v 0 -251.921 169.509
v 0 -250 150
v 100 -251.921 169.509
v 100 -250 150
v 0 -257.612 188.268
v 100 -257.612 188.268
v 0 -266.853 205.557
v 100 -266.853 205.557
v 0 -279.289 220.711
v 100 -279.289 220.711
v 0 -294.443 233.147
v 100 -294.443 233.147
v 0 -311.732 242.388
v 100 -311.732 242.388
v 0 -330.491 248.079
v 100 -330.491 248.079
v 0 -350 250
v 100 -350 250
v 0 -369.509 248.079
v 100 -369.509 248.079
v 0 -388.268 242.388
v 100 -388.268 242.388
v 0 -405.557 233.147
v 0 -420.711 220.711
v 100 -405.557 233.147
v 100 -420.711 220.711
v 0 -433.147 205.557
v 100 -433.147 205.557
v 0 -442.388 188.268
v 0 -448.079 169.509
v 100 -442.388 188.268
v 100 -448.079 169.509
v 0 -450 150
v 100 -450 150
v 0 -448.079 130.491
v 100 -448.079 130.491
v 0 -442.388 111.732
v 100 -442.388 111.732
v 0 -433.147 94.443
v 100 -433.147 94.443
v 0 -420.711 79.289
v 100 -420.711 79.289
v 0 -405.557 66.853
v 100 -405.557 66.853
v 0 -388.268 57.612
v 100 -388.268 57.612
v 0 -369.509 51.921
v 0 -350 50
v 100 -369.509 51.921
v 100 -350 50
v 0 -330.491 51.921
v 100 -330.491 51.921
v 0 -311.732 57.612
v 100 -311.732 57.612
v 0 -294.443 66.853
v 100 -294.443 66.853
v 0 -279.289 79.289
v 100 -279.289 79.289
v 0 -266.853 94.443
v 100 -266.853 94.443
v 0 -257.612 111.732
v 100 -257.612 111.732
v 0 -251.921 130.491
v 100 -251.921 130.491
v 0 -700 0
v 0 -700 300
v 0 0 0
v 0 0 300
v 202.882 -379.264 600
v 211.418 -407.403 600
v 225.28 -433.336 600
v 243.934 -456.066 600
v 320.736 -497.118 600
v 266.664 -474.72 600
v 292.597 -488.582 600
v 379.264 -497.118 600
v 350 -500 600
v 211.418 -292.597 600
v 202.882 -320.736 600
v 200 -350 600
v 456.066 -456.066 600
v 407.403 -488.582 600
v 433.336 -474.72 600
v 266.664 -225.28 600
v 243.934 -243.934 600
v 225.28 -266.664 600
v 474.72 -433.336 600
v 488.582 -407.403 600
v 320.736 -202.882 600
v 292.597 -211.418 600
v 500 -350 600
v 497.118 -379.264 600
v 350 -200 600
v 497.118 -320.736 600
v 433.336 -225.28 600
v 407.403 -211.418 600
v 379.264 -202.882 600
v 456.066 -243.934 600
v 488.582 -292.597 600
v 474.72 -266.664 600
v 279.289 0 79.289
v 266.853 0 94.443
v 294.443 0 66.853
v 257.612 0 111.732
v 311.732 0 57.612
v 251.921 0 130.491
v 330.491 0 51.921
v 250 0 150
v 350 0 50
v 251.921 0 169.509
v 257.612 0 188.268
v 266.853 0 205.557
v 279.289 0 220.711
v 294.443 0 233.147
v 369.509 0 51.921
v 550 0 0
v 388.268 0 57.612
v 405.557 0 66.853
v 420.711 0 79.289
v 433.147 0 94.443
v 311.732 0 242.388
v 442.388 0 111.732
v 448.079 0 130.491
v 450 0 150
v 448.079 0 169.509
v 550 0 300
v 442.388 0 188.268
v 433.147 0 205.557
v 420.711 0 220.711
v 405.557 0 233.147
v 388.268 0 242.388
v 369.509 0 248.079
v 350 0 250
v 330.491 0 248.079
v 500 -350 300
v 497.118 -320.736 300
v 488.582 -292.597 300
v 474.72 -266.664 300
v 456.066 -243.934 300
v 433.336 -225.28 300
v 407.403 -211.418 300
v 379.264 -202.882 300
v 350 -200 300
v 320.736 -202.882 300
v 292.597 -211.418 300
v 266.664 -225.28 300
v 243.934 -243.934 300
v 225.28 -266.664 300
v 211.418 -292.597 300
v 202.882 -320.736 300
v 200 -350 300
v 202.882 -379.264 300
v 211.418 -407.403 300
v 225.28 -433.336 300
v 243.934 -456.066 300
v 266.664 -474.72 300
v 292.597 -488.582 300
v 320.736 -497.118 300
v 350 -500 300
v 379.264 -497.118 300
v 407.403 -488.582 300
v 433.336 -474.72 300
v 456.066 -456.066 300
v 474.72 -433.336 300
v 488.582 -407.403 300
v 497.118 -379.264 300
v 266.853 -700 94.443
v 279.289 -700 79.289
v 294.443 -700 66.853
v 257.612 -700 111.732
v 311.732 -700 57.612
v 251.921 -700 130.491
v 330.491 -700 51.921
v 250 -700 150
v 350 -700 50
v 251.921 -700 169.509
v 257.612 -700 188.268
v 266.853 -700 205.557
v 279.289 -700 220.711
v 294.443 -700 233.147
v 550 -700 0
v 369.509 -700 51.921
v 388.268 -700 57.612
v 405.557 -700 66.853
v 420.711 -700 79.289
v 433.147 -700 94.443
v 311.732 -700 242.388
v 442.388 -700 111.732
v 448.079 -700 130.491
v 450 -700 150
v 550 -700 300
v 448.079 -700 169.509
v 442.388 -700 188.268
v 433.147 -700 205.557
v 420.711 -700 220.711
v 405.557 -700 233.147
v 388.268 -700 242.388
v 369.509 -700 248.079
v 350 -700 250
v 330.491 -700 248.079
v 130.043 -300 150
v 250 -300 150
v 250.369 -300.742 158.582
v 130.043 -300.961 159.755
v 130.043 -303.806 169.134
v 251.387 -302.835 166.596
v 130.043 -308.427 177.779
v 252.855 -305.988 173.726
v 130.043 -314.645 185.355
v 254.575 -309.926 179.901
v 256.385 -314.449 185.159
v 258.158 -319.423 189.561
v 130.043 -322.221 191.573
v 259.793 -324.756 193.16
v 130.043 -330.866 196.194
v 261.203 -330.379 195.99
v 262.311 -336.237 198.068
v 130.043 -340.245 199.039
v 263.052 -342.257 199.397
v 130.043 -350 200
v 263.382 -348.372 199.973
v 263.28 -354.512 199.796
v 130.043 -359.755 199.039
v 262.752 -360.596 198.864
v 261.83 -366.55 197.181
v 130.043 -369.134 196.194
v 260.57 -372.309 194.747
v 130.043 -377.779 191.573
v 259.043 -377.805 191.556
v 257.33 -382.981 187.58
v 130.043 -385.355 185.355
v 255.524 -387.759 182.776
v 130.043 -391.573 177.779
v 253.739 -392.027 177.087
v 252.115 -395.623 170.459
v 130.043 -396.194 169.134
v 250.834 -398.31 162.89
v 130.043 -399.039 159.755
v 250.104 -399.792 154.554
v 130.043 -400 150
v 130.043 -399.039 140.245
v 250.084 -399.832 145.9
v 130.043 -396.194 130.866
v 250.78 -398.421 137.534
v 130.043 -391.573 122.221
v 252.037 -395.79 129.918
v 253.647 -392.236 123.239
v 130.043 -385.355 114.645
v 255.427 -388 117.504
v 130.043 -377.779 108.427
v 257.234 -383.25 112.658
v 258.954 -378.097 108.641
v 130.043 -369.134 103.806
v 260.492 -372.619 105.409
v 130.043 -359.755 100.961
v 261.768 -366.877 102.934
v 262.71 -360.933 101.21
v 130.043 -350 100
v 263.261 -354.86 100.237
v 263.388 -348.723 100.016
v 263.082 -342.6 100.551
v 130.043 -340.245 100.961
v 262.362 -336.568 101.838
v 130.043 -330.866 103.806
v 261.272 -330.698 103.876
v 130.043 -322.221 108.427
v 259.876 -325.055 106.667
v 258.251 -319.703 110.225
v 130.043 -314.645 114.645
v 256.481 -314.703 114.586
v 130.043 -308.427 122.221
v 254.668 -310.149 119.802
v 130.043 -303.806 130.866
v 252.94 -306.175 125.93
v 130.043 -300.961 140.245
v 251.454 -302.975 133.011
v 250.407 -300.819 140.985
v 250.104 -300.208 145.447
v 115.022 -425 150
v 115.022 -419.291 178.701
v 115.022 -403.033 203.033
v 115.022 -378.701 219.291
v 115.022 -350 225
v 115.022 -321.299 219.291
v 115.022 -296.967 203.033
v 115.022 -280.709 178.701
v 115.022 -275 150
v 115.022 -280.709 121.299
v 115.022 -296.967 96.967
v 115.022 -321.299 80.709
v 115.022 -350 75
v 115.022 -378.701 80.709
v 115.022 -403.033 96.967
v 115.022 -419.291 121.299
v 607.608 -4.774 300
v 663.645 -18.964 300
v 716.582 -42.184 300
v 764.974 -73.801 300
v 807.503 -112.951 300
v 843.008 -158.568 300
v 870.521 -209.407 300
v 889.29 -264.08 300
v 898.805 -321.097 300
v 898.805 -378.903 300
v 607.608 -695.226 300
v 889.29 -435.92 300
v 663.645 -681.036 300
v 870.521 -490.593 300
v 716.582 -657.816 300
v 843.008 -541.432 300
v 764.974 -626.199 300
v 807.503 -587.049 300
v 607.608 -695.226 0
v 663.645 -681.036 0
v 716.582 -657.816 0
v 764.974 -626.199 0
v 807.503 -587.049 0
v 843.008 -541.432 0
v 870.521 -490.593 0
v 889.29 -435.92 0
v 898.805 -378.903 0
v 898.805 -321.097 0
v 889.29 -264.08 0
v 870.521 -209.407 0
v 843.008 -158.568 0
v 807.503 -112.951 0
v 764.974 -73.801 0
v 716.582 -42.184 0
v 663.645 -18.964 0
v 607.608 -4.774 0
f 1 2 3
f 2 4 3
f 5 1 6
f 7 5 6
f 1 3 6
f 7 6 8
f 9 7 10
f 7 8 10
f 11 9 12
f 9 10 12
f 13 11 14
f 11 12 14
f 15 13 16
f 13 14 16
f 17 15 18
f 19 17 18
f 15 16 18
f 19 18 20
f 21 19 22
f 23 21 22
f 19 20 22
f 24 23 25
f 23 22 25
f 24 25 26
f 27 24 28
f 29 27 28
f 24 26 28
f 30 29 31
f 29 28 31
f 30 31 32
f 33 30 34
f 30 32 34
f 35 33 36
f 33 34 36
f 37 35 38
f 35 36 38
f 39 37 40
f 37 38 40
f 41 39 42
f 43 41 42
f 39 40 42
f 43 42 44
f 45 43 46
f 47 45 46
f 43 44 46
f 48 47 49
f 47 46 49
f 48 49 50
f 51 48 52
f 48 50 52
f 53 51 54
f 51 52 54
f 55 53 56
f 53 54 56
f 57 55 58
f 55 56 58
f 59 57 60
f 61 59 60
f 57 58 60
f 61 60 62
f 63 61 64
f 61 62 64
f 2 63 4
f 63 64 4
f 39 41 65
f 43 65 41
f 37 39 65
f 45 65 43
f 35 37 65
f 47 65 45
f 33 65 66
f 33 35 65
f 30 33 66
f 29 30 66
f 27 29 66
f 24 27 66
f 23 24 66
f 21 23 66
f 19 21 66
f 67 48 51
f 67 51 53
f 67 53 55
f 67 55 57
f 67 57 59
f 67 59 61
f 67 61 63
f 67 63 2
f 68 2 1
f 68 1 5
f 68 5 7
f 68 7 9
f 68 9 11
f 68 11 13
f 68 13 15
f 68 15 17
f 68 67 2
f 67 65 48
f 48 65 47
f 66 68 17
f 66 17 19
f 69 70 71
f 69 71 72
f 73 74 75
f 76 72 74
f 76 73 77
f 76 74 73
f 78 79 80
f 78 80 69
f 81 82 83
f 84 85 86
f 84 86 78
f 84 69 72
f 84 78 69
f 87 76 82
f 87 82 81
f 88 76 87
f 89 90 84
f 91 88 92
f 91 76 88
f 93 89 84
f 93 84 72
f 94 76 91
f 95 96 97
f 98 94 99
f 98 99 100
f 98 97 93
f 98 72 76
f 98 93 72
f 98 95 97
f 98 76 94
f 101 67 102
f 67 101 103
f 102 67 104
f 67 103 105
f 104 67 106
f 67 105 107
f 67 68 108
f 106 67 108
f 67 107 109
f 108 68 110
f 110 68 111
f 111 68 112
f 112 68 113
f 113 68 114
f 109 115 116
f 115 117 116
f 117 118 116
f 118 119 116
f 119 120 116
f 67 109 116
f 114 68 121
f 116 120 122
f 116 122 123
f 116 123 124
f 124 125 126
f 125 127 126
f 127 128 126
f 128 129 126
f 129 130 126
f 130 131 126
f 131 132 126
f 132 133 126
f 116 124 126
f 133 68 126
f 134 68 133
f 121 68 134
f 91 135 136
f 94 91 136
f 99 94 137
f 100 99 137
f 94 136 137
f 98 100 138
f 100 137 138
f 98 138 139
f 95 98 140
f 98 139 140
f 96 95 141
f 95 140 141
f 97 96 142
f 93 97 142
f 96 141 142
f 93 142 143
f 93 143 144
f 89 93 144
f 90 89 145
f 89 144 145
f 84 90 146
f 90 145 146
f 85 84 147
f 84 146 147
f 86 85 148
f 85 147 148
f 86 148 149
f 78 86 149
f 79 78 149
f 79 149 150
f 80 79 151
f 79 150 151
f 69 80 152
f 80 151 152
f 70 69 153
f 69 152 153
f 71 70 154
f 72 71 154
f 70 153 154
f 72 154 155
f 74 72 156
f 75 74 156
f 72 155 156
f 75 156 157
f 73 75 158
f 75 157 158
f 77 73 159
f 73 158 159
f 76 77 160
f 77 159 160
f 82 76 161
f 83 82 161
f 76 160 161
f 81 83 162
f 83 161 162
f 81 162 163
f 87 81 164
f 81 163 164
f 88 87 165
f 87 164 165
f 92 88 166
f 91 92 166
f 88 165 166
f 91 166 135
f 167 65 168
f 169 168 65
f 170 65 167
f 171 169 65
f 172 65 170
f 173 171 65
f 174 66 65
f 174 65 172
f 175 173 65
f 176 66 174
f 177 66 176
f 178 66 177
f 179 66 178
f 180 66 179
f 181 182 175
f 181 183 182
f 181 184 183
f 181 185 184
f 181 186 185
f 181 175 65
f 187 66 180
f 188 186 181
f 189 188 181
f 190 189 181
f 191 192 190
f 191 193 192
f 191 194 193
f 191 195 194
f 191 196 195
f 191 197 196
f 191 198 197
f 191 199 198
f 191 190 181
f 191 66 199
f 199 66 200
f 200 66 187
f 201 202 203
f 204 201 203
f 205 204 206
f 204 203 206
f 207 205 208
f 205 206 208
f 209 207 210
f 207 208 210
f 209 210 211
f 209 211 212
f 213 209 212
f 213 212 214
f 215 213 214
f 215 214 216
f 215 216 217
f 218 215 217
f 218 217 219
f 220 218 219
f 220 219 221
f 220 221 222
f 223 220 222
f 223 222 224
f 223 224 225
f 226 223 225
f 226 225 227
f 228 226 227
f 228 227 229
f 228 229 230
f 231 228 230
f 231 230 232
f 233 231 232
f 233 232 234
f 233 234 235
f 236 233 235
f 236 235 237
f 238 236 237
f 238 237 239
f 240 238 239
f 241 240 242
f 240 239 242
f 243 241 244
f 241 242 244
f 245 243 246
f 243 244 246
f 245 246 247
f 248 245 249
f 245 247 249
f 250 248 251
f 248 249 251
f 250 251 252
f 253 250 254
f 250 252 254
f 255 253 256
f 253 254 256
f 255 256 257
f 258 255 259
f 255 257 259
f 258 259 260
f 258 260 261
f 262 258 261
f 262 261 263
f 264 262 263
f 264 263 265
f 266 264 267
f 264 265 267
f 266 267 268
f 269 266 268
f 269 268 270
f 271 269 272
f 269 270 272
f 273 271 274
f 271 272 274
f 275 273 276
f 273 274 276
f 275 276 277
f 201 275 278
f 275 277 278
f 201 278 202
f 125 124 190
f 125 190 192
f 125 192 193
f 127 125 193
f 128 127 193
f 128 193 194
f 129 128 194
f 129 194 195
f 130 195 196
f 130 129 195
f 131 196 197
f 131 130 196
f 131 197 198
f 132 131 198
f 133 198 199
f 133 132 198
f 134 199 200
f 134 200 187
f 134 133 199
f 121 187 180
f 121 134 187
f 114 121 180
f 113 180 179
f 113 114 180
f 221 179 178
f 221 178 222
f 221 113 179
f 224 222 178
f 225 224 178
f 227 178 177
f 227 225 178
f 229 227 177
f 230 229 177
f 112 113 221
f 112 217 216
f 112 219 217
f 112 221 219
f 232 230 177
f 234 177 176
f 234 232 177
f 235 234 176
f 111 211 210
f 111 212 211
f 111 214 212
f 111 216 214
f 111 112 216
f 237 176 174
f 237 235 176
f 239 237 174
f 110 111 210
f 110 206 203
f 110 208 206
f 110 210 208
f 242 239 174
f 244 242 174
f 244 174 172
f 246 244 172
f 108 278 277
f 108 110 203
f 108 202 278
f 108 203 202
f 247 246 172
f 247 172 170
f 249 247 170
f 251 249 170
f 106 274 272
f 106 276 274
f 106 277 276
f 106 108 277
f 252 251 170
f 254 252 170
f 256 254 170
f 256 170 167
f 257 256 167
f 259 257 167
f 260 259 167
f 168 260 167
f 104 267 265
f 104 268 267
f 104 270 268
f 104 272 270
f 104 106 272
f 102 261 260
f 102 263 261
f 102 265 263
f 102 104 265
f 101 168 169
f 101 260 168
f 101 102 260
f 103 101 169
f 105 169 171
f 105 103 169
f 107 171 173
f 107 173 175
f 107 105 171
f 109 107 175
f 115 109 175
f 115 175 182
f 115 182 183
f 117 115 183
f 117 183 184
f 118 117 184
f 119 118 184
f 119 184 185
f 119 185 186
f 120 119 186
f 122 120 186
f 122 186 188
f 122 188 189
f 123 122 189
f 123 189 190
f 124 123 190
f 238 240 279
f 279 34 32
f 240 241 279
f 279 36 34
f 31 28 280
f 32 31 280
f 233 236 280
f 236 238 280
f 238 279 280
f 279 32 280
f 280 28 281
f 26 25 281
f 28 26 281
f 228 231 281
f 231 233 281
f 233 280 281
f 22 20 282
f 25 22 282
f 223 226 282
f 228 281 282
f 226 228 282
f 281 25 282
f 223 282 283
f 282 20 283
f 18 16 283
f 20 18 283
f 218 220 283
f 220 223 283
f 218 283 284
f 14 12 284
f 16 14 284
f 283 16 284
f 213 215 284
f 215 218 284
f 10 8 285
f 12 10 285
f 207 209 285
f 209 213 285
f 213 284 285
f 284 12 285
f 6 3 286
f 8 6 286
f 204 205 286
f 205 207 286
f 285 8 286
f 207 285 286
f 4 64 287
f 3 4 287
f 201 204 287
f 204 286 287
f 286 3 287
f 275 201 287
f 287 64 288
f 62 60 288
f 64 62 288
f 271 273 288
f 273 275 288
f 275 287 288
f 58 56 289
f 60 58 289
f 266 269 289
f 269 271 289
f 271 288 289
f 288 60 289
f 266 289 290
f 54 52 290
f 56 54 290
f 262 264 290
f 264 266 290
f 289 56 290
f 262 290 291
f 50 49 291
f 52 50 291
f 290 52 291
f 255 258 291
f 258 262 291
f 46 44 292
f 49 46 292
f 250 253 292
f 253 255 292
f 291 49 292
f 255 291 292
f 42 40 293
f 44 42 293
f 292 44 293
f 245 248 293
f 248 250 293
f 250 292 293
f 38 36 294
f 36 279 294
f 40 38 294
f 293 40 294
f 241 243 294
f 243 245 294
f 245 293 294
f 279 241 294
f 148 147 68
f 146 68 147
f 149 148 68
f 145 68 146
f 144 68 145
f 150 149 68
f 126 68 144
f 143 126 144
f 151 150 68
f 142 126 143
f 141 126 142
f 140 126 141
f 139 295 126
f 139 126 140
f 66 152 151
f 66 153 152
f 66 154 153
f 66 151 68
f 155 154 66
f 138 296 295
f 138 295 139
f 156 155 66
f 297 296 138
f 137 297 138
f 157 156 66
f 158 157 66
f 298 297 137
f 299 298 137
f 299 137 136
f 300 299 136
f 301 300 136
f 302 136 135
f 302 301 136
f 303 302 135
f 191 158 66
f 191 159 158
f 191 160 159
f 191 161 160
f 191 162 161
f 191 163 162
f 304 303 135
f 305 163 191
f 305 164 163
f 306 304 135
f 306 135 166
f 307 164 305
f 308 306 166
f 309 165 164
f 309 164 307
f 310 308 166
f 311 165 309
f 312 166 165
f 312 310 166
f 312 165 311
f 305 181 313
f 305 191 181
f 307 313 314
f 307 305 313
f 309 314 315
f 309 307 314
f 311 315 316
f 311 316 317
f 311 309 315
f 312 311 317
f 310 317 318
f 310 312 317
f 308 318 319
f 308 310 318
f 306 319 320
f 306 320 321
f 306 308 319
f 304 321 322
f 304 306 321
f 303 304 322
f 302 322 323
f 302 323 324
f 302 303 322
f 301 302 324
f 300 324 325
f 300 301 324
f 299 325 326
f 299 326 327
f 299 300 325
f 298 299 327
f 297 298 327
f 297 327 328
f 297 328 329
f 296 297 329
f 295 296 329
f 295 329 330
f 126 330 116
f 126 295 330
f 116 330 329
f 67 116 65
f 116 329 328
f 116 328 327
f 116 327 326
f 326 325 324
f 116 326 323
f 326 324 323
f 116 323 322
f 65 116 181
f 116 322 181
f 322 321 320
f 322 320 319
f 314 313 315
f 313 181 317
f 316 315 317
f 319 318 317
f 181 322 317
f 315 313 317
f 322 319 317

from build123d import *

# Parameters (mm, degrees)
F0_W     = 550
F0_H     = 300
F0_R     = 100
F1_DEPTH = 700
F2_W     = 350
F2_H     = 300
F3_ANGLE = 180
F5_D     = 100
F5_DEPTH = 350
F5_TIP   = 30.0430309514
F6_D     = 200
F6_DEPTH = 100
F6_TIP   = 60.0860619028
F7_R     = 150
F8_DEPTH = 300


with BuildPart() as f1:
    # F0 (on Front) → F1 (new body)
    with BuildSketch(Plane.XZ):
        with Locations((275, 150)):
            Rectangle(F0_W, F0_H)
        with Locations((350, 150)):
            Circle(F0_R, mode=Mode.SUBTRACT)
    extrude(amount=F1_DEPTH)

    # F2 (on face) → F3 (revolve)
    with BuildSketch(Plane.YZ.offset(550)):
        with Locations((-525, 150)):
            Rectangle(F2_W, F2_H)
    revolve(axis=Axis((550, -350, 150), (0, 0, 1)), revolution_arc=F3_ANGLE)

    # F5
    with Locations(Plane(origin=(0, 0, 0), x_dir=(0, -1, 0), z_dir=(-1, 0, 0))):
        with Locations((350, 150)):
            Hole(F5_D / 2, depth=F5_DEPTH)
            with Locations((0, 0, -(F5_DEPTH + F5_TIP / 2))):  # 118° drill point
                Cone(0, F5_D / 2, F5_TIP, mode=Mode.SUBTRACT)

    # F6
    with Locations(Plane(origin=(0, 0, 0), x_dir=(0, -1, 0), z_dir=(-1, 0, 0))):
        with Locations((350, 150)):
            Hole(F6_D / 2, depth=F6_DEPTH)
            with Locations((0, 0, -(F6_DEPTH + F6_TIP / 2))):  # 118° drill point
                Cone(0, F6_D / 2, F6_TIP, mode=Mode.SUBTRACT)

    # F7 (on face) → F8 (join)
    with BuildSketch(Plane.XY.offset(300)):
        with Locations((350, -350)):
            Circle(F7_R)
    extrude(amount=F8_DEPTH)


solid = f1.part
